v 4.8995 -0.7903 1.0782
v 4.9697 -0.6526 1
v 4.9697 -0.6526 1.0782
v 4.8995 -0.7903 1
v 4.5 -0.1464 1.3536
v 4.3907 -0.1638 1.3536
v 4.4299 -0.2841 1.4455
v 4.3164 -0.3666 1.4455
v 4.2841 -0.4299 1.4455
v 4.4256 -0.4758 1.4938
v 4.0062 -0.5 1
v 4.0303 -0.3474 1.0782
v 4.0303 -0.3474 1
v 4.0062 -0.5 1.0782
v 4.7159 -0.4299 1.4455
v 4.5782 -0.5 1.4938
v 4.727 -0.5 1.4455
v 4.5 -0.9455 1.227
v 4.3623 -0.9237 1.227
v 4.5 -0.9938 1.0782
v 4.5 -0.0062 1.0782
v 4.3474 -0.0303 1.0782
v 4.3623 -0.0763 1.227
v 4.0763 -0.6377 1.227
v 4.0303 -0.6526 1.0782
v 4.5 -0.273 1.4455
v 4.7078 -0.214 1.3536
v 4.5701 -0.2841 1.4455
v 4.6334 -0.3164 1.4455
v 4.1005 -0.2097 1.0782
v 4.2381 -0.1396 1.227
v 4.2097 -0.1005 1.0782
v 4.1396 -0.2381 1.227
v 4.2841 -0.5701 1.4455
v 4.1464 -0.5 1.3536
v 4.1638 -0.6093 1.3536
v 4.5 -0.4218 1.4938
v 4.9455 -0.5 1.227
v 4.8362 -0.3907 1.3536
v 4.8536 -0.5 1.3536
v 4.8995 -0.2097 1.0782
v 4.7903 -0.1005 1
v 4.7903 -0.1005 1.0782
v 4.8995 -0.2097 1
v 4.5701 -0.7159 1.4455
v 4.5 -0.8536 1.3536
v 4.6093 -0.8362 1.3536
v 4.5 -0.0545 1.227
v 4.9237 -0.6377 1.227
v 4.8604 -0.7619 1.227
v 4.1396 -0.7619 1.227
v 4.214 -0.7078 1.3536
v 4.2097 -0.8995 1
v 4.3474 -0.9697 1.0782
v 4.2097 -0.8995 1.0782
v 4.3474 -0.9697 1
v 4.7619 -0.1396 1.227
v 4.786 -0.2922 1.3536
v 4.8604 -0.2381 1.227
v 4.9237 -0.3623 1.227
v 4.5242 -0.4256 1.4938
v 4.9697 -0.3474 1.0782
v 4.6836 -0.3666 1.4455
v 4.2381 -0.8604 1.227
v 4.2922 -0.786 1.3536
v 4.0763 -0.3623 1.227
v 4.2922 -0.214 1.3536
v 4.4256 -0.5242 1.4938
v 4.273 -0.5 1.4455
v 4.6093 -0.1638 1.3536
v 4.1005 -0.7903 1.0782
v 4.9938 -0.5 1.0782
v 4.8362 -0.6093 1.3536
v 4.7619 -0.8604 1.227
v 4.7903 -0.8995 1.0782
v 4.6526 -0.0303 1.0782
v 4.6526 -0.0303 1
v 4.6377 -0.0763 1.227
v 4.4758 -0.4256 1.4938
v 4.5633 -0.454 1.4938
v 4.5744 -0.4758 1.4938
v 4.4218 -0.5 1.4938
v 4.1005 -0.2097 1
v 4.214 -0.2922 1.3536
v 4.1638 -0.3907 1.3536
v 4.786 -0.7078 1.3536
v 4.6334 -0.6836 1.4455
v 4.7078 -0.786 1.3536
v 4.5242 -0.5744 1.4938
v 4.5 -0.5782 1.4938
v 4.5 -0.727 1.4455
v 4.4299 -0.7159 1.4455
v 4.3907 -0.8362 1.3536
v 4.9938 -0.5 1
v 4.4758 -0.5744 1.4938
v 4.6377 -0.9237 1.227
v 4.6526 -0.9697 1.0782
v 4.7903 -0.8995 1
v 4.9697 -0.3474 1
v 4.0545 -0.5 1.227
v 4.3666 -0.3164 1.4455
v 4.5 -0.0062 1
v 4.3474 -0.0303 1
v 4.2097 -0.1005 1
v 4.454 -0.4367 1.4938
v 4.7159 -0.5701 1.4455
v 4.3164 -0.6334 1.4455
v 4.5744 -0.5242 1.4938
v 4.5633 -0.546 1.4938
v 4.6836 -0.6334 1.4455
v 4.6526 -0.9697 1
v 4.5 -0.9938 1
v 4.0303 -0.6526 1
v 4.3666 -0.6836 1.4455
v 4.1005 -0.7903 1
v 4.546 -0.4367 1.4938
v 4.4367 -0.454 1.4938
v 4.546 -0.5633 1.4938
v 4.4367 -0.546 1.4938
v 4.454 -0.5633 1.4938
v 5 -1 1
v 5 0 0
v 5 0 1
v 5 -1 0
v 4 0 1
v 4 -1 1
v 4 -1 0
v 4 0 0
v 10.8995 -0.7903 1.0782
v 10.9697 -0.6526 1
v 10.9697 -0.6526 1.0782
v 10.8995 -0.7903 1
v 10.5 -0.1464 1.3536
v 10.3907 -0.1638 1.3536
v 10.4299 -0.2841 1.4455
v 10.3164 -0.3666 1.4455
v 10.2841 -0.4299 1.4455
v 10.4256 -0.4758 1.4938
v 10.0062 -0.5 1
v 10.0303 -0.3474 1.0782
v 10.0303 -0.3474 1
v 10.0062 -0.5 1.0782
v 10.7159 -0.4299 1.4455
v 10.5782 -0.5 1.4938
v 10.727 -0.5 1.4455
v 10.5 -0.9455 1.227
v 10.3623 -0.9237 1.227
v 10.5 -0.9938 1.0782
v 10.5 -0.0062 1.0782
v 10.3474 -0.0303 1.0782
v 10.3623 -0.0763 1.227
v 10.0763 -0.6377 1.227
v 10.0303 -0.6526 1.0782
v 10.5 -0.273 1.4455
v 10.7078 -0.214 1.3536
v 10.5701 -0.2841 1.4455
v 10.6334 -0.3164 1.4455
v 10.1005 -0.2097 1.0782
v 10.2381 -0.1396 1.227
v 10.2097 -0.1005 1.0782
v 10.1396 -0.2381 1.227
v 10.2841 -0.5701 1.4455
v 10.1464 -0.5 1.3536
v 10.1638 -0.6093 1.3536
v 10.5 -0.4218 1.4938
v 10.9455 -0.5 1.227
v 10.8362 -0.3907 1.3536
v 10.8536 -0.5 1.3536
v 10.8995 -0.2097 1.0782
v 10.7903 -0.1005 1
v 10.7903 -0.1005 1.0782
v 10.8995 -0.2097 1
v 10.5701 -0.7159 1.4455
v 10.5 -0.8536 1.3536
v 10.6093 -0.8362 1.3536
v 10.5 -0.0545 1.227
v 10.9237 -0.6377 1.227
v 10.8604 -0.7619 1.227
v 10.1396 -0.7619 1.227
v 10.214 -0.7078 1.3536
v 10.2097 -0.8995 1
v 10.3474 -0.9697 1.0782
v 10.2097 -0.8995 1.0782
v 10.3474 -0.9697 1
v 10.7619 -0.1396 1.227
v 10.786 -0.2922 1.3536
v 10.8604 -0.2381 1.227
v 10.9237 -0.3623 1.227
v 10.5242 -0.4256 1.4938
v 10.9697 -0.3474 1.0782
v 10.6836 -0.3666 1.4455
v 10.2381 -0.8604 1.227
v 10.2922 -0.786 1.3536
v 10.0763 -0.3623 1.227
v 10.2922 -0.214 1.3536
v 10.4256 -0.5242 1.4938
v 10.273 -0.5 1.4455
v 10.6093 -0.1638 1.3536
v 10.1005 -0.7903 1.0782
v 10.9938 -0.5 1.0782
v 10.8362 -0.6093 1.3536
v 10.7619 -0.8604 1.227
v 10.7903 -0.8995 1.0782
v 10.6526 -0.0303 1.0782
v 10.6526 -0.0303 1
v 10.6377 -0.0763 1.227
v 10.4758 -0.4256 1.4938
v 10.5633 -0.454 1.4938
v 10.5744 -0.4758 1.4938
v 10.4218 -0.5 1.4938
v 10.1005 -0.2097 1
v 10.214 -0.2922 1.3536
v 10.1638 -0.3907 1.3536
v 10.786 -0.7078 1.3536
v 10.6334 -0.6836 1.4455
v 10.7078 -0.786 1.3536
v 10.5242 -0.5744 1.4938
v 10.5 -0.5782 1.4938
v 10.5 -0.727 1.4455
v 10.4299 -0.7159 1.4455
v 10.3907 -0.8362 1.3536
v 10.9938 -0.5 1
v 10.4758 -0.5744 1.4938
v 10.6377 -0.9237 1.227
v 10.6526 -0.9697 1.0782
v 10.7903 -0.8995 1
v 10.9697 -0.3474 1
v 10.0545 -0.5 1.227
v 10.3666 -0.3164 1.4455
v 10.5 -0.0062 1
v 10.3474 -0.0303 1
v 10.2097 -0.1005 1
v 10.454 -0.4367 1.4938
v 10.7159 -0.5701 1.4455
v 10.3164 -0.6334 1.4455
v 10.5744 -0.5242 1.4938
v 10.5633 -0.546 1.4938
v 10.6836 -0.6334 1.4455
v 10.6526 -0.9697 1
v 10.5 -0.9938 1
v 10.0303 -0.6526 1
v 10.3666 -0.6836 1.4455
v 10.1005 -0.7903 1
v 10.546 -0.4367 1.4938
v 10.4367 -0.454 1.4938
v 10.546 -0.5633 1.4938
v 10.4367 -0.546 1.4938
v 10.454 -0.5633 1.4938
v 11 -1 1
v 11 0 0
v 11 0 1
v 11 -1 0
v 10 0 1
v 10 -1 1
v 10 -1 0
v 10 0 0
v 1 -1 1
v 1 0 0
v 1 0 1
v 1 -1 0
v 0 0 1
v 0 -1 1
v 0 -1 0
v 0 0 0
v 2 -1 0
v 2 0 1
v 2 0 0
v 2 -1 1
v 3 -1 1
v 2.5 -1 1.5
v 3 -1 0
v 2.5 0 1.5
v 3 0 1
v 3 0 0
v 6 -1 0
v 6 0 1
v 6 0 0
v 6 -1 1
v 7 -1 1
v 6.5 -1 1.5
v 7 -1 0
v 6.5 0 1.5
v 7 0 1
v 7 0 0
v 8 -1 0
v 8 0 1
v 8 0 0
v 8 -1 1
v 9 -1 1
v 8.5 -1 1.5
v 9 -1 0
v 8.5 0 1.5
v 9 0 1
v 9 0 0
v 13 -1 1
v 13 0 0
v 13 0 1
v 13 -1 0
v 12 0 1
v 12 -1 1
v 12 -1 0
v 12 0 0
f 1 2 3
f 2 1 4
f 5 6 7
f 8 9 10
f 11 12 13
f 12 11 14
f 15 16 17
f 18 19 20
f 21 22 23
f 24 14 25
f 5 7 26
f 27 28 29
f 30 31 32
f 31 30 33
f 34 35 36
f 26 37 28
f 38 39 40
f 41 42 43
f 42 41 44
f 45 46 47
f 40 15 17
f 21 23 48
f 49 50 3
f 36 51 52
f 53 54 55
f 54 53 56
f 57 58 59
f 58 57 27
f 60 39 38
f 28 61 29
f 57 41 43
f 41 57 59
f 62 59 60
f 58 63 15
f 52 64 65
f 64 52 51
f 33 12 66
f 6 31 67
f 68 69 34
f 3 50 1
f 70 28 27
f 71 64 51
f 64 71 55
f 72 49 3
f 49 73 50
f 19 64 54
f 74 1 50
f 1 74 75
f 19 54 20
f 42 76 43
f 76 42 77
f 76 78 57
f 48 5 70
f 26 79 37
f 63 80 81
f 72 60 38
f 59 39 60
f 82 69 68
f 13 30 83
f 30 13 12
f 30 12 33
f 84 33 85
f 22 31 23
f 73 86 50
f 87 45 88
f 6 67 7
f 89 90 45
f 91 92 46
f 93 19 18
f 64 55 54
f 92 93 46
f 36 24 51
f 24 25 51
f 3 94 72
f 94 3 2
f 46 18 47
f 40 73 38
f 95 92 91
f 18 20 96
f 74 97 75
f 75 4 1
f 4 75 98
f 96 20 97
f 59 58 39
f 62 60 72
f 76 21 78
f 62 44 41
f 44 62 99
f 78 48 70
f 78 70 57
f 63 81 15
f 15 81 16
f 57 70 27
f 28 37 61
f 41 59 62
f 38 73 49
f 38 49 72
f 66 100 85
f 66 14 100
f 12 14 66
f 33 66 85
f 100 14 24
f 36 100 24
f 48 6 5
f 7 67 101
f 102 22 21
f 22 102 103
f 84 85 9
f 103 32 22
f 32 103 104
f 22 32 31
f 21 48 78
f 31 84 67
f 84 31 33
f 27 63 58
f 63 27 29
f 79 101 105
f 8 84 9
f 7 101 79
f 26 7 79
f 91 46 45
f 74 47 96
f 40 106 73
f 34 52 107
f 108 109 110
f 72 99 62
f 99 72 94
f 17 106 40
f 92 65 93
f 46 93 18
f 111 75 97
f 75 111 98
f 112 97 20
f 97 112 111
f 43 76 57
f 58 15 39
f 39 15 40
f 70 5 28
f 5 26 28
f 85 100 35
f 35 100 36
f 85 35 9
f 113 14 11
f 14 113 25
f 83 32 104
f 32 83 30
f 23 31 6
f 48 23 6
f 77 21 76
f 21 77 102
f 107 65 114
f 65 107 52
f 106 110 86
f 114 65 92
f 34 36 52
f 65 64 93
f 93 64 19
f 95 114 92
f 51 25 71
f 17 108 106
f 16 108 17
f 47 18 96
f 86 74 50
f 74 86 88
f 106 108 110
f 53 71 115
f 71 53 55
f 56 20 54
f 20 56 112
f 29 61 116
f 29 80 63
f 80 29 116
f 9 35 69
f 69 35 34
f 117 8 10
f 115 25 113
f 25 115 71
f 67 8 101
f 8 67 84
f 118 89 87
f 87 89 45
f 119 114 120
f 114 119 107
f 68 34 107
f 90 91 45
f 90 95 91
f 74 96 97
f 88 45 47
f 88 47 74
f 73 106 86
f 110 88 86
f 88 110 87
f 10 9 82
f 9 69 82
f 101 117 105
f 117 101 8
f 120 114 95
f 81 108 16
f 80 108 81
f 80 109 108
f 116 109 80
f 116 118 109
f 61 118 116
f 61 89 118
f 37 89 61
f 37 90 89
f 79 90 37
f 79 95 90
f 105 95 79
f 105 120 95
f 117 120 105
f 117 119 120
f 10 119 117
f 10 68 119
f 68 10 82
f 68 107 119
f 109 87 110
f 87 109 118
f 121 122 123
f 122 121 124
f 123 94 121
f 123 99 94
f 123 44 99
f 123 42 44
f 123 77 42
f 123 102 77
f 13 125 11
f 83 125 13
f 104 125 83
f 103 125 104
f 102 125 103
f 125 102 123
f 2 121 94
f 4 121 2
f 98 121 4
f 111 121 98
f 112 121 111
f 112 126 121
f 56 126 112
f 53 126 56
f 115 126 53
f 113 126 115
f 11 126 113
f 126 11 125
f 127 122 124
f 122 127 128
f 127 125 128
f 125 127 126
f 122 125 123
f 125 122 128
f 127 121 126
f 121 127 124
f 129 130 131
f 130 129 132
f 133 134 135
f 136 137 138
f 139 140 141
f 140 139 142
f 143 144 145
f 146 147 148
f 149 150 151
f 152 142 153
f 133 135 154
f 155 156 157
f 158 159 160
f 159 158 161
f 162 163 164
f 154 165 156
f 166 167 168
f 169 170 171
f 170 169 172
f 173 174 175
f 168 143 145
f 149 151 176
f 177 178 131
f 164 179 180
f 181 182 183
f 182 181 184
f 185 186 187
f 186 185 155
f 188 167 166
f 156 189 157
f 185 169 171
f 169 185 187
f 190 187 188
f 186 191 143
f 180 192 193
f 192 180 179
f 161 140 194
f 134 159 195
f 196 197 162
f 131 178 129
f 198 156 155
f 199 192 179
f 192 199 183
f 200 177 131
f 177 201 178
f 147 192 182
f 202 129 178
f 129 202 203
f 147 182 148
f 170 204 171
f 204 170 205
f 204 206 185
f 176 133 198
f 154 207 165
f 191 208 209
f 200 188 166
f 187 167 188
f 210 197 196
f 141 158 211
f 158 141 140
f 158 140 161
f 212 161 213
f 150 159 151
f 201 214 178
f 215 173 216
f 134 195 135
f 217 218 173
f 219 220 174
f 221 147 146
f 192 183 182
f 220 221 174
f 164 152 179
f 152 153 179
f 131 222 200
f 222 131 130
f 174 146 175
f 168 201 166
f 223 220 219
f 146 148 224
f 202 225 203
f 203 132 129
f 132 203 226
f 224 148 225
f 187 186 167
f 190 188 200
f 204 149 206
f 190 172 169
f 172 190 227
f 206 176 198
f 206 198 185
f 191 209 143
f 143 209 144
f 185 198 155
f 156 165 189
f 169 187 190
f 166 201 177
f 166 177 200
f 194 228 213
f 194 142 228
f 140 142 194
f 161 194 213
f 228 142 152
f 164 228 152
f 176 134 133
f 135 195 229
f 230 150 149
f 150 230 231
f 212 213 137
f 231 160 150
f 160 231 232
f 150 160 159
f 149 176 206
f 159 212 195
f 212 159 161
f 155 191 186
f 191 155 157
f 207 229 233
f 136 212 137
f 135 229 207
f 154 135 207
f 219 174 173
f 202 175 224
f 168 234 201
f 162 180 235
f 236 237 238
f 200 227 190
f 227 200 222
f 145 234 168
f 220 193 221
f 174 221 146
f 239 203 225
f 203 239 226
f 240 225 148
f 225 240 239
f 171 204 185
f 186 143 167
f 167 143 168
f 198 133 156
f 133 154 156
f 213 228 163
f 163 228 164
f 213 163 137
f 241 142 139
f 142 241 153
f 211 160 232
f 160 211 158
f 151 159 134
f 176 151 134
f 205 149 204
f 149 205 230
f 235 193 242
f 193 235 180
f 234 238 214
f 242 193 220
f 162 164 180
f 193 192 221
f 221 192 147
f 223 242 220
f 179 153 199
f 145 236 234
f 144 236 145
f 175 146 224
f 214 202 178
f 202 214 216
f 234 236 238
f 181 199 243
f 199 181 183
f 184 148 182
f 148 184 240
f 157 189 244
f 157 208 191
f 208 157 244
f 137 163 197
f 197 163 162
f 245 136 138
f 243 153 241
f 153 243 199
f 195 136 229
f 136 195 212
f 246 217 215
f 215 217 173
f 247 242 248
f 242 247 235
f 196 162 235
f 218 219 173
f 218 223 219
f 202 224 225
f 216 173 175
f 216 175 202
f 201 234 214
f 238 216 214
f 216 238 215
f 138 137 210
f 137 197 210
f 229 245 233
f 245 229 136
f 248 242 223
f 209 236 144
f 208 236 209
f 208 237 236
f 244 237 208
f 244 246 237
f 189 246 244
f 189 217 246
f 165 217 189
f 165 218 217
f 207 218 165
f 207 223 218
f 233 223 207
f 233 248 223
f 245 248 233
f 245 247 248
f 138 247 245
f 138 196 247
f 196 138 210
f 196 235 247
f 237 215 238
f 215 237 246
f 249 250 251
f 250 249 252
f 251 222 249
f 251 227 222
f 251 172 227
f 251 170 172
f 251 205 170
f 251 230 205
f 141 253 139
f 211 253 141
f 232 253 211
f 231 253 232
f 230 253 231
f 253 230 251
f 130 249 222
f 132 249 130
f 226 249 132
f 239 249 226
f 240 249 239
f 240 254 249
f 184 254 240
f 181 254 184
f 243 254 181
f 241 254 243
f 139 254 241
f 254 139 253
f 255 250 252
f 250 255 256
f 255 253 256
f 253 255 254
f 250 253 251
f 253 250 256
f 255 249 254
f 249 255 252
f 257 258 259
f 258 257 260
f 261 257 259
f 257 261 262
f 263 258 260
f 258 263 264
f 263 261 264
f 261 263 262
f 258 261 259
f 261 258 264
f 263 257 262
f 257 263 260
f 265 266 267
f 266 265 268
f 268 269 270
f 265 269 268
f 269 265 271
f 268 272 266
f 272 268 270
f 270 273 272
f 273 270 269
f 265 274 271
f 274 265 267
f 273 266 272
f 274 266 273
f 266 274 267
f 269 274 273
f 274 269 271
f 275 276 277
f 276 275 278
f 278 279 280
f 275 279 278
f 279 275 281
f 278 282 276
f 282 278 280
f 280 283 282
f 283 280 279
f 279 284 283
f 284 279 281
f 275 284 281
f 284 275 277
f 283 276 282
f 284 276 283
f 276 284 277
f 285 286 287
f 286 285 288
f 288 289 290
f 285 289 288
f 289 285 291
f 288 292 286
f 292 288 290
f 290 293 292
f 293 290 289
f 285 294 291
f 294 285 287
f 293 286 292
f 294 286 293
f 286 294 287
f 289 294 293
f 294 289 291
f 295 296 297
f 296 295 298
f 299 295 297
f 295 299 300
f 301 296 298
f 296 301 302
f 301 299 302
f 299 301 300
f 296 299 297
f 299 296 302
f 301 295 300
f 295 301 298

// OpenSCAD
module house(roof="flat",paint=[1,0,0]){
  color(paint)
  if(roof=="flat"){
    translate([0,-1,0])
    cube();
  } else if(roof=="pitched"){
    rotate([90,0,0])
    linear_extrude(height=1)
    polygon(points=[[0,0],[0,1],[0.5,1.5],[1,1],[1,0]],paths=[ [0,1,2,3,4] ]);
  } else if(roof=="domical"){
    translate([0,-1,0])
    union(){
      translate([0.5,0.5,1]) sphere(r=0.5,$fn=20);
      cube();   
    }
  }
}

union(){
  house();
  translate([2,0,0]) house("pitched");
  translate([4,0,0]) house("domical",[0,1,0]);
  translate([6,0,0]) house(roof="pitched",paint=[0,0,1]);
  translate([8,0,0]) house(paint=[0,0,0],roof="pitched");
  translate([10,0,0]) house(roof="domical");
  translate([12,0,0]) house(paint=[0,0.5,0.5]);
}
